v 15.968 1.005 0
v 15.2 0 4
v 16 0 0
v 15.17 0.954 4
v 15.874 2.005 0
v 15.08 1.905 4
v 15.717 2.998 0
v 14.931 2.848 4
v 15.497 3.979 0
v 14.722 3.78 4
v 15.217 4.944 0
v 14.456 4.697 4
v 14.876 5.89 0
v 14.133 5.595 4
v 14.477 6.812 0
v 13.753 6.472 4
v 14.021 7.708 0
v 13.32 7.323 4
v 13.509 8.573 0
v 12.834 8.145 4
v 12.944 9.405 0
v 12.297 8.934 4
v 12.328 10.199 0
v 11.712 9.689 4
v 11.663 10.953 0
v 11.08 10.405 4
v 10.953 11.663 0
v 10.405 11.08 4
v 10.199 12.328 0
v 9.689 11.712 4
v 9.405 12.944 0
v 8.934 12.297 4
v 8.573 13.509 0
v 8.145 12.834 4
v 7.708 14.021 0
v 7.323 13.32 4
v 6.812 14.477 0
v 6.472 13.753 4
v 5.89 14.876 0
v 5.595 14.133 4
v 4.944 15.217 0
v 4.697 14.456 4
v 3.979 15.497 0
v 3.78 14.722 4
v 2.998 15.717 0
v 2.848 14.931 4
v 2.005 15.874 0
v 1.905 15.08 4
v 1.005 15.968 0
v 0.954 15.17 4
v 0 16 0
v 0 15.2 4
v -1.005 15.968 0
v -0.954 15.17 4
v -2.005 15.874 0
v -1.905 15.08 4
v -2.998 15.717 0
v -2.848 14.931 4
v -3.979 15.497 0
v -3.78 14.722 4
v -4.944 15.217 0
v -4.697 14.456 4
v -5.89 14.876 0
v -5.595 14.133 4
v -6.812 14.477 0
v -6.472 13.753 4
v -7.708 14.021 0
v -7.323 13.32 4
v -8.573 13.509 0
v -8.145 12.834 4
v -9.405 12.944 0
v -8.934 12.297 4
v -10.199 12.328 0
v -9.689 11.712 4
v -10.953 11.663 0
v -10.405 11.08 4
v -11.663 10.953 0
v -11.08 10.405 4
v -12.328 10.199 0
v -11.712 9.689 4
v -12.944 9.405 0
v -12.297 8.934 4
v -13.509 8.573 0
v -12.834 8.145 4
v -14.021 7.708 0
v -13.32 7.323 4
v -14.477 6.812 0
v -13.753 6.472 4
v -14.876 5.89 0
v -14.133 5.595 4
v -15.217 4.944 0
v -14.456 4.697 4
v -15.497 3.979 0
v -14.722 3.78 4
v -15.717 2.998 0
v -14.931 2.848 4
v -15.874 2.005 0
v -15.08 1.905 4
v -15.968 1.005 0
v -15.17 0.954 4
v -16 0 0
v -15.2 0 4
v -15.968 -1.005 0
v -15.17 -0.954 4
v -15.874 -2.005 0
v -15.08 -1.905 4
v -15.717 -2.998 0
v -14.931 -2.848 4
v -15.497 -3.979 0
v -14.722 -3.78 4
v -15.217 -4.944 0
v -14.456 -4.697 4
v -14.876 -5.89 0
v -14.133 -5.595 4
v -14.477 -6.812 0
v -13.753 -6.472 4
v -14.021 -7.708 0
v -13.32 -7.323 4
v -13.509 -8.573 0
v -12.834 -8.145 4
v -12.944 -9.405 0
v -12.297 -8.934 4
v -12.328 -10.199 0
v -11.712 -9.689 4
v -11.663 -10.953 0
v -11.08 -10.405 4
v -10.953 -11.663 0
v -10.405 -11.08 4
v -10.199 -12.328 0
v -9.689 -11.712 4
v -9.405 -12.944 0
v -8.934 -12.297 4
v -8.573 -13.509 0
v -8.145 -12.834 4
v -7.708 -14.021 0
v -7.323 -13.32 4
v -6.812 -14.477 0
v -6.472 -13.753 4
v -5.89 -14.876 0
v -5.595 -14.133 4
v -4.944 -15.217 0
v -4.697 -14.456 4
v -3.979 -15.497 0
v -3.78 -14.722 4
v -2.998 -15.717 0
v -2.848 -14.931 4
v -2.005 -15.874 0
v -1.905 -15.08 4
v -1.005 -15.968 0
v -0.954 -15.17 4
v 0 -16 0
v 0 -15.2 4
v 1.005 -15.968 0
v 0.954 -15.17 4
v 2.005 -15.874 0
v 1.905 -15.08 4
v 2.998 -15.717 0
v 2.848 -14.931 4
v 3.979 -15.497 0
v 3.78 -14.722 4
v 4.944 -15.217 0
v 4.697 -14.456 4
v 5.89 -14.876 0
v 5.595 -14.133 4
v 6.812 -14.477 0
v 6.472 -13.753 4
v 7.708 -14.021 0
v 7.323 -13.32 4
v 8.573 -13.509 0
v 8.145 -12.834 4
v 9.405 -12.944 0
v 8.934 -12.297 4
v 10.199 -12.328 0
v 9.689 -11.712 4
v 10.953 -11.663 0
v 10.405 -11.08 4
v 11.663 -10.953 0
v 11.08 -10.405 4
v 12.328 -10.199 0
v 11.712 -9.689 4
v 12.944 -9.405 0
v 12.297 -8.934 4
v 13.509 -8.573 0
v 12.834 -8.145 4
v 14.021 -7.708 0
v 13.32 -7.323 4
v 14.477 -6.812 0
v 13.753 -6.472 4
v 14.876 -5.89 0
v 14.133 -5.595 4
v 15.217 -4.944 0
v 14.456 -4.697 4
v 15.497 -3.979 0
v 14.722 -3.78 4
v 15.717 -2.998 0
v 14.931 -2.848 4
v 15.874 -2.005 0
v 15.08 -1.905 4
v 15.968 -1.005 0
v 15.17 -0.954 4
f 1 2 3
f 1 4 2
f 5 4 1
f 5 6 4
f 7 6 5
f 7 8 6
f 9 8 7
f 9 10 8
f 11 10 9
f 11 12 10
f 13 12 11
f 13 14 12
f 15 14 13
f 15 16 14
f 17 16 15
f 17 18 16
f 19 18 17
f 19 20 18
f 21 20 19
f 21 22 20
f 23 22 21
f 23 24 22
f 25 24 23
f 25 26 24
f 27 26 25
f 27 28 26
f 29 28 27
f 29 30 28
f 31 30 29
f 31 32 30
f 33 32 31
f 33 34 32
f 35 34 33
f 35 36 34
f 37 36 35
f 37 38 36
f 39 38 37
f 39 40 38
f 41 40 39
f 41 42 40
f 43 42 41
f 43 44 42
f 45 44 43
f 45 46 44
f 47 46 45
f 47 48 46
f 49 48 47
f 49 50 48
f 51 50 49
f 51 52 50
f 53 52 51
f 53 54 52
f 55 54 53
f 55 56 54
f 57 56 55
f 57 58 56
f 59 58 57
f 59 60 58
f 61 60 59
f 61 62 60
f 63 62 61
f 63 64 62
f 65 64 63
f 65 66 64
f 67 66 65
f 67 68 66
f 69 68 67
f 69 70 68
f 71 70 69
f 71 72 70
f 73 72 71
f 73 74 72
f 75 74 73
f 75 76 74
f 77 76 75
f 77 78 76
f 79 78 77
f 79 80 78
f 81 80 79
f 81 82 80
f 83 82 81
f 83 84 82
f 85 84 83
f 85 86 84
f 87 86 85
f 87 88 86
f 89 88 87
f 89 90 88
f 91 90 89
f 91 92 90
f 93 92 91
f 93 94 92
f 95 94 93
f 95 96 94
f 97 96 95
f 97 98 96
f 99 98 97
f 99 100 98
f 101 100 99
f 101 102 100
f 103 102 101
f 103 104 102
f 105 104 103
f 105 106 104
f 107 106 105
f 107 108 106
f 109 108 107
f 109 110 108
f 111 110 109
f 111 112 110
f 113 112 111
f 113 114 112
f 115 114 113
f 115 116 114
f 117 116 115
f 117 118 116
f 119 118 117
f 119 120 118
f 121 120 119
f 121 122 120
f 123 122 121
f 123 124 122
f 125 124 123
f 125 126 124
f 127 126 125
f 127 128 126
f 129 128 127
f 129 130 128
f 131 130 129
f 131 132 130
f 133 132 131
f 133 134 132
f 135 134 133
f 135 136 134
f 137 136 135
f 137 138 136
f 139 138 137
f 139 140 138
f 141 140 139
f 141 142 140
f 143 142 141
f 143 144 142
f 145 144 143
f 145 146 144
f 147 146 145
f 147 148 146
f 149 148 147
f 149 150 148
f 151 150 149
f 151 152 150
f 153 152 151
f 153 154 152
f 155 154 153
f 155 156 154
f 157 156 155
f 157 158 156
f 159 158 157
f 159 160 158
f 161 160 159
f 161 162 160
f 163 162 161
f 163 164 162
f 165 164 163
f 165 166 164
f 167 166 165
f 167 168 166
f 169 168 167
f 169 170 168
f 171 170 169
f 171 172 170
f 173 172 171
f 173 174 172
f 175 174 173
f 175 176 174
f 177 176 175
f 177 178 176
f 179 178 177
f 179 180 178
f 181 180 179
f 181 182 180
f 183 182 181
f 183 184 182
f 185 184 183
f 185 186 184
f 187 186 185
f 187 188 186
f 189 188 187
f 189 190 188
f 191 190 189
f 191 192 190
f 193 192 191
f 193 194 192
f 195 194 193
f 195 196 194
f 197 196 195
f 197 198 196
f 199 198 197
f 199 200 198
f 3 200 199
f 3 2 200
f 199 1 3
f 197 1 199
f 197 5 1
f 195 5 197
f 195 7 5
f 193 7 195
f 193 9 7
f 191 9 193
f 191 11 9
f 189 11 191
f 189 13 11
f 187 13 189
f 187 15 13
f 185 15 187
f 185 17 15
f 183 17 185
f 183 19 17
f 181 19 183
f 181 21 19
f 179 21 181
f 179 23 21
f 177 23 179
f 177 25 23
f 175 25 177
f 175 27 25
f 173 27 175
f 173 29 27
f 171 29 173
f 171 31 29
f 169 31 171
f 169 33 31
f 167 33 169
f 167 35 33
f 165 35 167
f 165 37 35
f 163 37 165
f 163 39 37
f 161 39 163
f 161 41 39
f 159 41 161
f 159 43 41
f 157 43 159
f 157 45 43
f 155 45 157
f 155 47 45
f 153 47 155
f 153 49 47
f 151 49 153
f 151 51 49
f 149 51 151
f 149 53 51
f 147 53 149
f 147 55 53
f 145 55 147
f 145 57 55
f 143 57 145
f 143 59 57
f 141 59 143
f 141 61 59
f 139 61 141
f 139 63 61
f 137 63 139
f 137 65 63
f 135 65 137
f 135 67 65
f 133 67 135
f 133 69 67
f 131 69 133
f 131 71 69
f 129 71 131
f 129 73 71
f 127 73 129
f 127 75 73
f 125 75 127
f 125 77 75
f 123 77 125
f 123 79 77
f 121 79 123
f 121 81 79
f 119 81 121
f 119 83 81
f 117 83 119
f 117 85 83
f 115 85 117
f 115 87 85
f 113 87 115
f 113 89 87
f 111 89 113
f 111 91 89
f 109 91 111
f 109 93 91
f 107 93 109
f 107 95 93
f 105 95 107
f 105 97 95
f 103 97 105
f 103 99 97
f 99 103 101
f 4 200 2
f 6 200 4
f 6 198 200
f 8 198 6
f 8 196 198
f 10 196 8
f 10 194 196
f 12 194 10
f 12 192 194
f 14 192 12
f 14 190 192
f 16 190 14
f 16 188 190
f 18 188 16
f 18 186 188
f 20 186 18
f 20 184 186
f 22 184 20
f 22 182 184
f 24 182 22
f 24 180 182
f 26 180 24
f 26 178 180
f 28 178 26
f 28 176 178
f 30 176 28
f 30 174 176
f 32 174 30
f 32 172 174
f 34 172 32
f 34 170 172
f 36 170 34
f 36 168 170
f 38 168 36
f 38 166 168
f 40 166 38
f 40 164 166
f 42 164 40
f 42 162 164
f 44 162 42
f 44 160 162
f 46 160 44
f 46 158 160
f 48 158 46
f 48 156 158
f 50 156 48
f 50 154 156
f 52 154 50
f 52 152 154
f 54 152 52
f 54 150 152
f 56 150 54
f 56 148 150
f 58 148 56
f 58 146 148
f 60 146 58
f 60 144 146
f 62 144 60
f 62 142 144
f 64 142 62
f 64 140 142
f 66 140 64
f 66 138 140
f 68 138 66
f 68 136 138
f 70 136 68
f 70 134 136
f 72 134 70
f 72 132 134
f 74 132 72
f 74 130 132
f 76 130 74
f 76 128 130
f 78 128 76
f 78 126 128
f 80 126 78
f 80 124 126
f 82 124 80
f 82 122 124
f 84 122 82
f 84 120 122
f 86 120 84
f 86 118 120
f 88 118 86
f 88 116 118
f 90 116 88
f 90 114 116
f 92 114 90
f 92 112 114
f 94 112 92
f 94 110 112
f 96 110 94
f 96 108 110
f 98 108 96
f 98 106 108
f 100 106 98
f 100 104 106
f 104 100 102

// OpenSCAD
// file: ../build.scad
$build_id = "";

function building(filename) = is_undef(filename) ?
  !is_undef(build)
  : !is_undef(build) && build == filename;

function previewing() = !building();

module build(filename) {
  $build_id = filename;

  if(!is_undef(scad_build_scan) && scad_build_scan == true) {
    echo(str("scad_build_scan: ", filename));
  }
  else if(previewing() || build == filename) {
    children();
  }
}

module preview_row(spacing) {
  if(previewing()) {
    for(x = [0:1:$children - 1]) {
      translate([x * spacing, 0, 0]) {
        children(x);
      }
    }
  }
  else {
    children();
  }
}

module preview_column(spacing) {
  if(previewing()) {
    for(y = [0:1:$children - 1]) {
      translate([0, y * spacing, 0]) {
        children(y);
      }
    }
  }
  else {
    children();
  }
}
// file: ../minibase.scad
// Based off of titancraft's Customizable Miniature Base (CC0 1.0)
// https://www.thingiverse.com/thing:1112237

include <./build.scad>

$base_rim = 1; //	[1: tapered, 2: inclined, 3: flat]
// Number of sides:
$base_shape = 100; //	[30:Low-res Circle, 100: Hi-res Circle, 5:Pentagon, 6:Hexagon, 8:Octagon, 4:Square, 3:Triangle]

$base_diameter = 32;
$base_height = 4;
$base_slant = 95;

// Percentage:
$base_stretch = 100;

//(tapered base only)
$base_inner_circle_ratio = 40;

module tapered(r=40) {
  $base_rim = 1;
  $base_inner_circle_ratio = r;

  children();
}

module inclined() {
  $base_rim = 2;

  children();
}

module flat() {
  $base_rim = 3;

  children();
}

module shape(s) {
  $base_shape = s;

  children();
}

module diameter(d) {
  $base_diameter = d;

  children();
}

module height(h) {
  $base_height = h;

  children();
}

module slant(s) {
  $base_slant = s;

  children();
}

module stretch(s) {
  $base_stretch = s;

  children();
}

module base(id) {
  build(id) union() {
    radius = $base_diameter/2;
    scale([$base_stretch/100, 1, 1]){
      if ($base_rim == 1){
        // tapered base
        cyl1_height = $base_height * (1-$base_inner_circle_ratio/100);
        cylinder(cyl1_height, radius, radius * $base_slant/100, $fn=$base_shape);

        cyl2_radius = radius  * $base_slant/100 * .95;
        cyl2_height = $base_height - cyl1_height;

        translate([0, 0, cyl1_height]){
          cylinder(cyl2_height, cyl2_radius, cyl2_radius * $base_slant/100, $fn=$base_shape);
          cylinder(cyl2_height*.5, radius * $base_slant/100, cyl2_radius, $fn=$base_shape);
        }
      } else if ($base_rim == 2){
        // inclined base
        cylinder($base_height, radius, radius * $base_slant/100, $fn=$base_shape);
      } else if ($base_rim == 3){
        // flat base

        cylinder($base_height, radius, radius, $fn=$base_shape);
      }
    }
  }
}
// main file
include <../minibase.scad>

inclined() diameter(32) base("32mm-opr-infantry");
